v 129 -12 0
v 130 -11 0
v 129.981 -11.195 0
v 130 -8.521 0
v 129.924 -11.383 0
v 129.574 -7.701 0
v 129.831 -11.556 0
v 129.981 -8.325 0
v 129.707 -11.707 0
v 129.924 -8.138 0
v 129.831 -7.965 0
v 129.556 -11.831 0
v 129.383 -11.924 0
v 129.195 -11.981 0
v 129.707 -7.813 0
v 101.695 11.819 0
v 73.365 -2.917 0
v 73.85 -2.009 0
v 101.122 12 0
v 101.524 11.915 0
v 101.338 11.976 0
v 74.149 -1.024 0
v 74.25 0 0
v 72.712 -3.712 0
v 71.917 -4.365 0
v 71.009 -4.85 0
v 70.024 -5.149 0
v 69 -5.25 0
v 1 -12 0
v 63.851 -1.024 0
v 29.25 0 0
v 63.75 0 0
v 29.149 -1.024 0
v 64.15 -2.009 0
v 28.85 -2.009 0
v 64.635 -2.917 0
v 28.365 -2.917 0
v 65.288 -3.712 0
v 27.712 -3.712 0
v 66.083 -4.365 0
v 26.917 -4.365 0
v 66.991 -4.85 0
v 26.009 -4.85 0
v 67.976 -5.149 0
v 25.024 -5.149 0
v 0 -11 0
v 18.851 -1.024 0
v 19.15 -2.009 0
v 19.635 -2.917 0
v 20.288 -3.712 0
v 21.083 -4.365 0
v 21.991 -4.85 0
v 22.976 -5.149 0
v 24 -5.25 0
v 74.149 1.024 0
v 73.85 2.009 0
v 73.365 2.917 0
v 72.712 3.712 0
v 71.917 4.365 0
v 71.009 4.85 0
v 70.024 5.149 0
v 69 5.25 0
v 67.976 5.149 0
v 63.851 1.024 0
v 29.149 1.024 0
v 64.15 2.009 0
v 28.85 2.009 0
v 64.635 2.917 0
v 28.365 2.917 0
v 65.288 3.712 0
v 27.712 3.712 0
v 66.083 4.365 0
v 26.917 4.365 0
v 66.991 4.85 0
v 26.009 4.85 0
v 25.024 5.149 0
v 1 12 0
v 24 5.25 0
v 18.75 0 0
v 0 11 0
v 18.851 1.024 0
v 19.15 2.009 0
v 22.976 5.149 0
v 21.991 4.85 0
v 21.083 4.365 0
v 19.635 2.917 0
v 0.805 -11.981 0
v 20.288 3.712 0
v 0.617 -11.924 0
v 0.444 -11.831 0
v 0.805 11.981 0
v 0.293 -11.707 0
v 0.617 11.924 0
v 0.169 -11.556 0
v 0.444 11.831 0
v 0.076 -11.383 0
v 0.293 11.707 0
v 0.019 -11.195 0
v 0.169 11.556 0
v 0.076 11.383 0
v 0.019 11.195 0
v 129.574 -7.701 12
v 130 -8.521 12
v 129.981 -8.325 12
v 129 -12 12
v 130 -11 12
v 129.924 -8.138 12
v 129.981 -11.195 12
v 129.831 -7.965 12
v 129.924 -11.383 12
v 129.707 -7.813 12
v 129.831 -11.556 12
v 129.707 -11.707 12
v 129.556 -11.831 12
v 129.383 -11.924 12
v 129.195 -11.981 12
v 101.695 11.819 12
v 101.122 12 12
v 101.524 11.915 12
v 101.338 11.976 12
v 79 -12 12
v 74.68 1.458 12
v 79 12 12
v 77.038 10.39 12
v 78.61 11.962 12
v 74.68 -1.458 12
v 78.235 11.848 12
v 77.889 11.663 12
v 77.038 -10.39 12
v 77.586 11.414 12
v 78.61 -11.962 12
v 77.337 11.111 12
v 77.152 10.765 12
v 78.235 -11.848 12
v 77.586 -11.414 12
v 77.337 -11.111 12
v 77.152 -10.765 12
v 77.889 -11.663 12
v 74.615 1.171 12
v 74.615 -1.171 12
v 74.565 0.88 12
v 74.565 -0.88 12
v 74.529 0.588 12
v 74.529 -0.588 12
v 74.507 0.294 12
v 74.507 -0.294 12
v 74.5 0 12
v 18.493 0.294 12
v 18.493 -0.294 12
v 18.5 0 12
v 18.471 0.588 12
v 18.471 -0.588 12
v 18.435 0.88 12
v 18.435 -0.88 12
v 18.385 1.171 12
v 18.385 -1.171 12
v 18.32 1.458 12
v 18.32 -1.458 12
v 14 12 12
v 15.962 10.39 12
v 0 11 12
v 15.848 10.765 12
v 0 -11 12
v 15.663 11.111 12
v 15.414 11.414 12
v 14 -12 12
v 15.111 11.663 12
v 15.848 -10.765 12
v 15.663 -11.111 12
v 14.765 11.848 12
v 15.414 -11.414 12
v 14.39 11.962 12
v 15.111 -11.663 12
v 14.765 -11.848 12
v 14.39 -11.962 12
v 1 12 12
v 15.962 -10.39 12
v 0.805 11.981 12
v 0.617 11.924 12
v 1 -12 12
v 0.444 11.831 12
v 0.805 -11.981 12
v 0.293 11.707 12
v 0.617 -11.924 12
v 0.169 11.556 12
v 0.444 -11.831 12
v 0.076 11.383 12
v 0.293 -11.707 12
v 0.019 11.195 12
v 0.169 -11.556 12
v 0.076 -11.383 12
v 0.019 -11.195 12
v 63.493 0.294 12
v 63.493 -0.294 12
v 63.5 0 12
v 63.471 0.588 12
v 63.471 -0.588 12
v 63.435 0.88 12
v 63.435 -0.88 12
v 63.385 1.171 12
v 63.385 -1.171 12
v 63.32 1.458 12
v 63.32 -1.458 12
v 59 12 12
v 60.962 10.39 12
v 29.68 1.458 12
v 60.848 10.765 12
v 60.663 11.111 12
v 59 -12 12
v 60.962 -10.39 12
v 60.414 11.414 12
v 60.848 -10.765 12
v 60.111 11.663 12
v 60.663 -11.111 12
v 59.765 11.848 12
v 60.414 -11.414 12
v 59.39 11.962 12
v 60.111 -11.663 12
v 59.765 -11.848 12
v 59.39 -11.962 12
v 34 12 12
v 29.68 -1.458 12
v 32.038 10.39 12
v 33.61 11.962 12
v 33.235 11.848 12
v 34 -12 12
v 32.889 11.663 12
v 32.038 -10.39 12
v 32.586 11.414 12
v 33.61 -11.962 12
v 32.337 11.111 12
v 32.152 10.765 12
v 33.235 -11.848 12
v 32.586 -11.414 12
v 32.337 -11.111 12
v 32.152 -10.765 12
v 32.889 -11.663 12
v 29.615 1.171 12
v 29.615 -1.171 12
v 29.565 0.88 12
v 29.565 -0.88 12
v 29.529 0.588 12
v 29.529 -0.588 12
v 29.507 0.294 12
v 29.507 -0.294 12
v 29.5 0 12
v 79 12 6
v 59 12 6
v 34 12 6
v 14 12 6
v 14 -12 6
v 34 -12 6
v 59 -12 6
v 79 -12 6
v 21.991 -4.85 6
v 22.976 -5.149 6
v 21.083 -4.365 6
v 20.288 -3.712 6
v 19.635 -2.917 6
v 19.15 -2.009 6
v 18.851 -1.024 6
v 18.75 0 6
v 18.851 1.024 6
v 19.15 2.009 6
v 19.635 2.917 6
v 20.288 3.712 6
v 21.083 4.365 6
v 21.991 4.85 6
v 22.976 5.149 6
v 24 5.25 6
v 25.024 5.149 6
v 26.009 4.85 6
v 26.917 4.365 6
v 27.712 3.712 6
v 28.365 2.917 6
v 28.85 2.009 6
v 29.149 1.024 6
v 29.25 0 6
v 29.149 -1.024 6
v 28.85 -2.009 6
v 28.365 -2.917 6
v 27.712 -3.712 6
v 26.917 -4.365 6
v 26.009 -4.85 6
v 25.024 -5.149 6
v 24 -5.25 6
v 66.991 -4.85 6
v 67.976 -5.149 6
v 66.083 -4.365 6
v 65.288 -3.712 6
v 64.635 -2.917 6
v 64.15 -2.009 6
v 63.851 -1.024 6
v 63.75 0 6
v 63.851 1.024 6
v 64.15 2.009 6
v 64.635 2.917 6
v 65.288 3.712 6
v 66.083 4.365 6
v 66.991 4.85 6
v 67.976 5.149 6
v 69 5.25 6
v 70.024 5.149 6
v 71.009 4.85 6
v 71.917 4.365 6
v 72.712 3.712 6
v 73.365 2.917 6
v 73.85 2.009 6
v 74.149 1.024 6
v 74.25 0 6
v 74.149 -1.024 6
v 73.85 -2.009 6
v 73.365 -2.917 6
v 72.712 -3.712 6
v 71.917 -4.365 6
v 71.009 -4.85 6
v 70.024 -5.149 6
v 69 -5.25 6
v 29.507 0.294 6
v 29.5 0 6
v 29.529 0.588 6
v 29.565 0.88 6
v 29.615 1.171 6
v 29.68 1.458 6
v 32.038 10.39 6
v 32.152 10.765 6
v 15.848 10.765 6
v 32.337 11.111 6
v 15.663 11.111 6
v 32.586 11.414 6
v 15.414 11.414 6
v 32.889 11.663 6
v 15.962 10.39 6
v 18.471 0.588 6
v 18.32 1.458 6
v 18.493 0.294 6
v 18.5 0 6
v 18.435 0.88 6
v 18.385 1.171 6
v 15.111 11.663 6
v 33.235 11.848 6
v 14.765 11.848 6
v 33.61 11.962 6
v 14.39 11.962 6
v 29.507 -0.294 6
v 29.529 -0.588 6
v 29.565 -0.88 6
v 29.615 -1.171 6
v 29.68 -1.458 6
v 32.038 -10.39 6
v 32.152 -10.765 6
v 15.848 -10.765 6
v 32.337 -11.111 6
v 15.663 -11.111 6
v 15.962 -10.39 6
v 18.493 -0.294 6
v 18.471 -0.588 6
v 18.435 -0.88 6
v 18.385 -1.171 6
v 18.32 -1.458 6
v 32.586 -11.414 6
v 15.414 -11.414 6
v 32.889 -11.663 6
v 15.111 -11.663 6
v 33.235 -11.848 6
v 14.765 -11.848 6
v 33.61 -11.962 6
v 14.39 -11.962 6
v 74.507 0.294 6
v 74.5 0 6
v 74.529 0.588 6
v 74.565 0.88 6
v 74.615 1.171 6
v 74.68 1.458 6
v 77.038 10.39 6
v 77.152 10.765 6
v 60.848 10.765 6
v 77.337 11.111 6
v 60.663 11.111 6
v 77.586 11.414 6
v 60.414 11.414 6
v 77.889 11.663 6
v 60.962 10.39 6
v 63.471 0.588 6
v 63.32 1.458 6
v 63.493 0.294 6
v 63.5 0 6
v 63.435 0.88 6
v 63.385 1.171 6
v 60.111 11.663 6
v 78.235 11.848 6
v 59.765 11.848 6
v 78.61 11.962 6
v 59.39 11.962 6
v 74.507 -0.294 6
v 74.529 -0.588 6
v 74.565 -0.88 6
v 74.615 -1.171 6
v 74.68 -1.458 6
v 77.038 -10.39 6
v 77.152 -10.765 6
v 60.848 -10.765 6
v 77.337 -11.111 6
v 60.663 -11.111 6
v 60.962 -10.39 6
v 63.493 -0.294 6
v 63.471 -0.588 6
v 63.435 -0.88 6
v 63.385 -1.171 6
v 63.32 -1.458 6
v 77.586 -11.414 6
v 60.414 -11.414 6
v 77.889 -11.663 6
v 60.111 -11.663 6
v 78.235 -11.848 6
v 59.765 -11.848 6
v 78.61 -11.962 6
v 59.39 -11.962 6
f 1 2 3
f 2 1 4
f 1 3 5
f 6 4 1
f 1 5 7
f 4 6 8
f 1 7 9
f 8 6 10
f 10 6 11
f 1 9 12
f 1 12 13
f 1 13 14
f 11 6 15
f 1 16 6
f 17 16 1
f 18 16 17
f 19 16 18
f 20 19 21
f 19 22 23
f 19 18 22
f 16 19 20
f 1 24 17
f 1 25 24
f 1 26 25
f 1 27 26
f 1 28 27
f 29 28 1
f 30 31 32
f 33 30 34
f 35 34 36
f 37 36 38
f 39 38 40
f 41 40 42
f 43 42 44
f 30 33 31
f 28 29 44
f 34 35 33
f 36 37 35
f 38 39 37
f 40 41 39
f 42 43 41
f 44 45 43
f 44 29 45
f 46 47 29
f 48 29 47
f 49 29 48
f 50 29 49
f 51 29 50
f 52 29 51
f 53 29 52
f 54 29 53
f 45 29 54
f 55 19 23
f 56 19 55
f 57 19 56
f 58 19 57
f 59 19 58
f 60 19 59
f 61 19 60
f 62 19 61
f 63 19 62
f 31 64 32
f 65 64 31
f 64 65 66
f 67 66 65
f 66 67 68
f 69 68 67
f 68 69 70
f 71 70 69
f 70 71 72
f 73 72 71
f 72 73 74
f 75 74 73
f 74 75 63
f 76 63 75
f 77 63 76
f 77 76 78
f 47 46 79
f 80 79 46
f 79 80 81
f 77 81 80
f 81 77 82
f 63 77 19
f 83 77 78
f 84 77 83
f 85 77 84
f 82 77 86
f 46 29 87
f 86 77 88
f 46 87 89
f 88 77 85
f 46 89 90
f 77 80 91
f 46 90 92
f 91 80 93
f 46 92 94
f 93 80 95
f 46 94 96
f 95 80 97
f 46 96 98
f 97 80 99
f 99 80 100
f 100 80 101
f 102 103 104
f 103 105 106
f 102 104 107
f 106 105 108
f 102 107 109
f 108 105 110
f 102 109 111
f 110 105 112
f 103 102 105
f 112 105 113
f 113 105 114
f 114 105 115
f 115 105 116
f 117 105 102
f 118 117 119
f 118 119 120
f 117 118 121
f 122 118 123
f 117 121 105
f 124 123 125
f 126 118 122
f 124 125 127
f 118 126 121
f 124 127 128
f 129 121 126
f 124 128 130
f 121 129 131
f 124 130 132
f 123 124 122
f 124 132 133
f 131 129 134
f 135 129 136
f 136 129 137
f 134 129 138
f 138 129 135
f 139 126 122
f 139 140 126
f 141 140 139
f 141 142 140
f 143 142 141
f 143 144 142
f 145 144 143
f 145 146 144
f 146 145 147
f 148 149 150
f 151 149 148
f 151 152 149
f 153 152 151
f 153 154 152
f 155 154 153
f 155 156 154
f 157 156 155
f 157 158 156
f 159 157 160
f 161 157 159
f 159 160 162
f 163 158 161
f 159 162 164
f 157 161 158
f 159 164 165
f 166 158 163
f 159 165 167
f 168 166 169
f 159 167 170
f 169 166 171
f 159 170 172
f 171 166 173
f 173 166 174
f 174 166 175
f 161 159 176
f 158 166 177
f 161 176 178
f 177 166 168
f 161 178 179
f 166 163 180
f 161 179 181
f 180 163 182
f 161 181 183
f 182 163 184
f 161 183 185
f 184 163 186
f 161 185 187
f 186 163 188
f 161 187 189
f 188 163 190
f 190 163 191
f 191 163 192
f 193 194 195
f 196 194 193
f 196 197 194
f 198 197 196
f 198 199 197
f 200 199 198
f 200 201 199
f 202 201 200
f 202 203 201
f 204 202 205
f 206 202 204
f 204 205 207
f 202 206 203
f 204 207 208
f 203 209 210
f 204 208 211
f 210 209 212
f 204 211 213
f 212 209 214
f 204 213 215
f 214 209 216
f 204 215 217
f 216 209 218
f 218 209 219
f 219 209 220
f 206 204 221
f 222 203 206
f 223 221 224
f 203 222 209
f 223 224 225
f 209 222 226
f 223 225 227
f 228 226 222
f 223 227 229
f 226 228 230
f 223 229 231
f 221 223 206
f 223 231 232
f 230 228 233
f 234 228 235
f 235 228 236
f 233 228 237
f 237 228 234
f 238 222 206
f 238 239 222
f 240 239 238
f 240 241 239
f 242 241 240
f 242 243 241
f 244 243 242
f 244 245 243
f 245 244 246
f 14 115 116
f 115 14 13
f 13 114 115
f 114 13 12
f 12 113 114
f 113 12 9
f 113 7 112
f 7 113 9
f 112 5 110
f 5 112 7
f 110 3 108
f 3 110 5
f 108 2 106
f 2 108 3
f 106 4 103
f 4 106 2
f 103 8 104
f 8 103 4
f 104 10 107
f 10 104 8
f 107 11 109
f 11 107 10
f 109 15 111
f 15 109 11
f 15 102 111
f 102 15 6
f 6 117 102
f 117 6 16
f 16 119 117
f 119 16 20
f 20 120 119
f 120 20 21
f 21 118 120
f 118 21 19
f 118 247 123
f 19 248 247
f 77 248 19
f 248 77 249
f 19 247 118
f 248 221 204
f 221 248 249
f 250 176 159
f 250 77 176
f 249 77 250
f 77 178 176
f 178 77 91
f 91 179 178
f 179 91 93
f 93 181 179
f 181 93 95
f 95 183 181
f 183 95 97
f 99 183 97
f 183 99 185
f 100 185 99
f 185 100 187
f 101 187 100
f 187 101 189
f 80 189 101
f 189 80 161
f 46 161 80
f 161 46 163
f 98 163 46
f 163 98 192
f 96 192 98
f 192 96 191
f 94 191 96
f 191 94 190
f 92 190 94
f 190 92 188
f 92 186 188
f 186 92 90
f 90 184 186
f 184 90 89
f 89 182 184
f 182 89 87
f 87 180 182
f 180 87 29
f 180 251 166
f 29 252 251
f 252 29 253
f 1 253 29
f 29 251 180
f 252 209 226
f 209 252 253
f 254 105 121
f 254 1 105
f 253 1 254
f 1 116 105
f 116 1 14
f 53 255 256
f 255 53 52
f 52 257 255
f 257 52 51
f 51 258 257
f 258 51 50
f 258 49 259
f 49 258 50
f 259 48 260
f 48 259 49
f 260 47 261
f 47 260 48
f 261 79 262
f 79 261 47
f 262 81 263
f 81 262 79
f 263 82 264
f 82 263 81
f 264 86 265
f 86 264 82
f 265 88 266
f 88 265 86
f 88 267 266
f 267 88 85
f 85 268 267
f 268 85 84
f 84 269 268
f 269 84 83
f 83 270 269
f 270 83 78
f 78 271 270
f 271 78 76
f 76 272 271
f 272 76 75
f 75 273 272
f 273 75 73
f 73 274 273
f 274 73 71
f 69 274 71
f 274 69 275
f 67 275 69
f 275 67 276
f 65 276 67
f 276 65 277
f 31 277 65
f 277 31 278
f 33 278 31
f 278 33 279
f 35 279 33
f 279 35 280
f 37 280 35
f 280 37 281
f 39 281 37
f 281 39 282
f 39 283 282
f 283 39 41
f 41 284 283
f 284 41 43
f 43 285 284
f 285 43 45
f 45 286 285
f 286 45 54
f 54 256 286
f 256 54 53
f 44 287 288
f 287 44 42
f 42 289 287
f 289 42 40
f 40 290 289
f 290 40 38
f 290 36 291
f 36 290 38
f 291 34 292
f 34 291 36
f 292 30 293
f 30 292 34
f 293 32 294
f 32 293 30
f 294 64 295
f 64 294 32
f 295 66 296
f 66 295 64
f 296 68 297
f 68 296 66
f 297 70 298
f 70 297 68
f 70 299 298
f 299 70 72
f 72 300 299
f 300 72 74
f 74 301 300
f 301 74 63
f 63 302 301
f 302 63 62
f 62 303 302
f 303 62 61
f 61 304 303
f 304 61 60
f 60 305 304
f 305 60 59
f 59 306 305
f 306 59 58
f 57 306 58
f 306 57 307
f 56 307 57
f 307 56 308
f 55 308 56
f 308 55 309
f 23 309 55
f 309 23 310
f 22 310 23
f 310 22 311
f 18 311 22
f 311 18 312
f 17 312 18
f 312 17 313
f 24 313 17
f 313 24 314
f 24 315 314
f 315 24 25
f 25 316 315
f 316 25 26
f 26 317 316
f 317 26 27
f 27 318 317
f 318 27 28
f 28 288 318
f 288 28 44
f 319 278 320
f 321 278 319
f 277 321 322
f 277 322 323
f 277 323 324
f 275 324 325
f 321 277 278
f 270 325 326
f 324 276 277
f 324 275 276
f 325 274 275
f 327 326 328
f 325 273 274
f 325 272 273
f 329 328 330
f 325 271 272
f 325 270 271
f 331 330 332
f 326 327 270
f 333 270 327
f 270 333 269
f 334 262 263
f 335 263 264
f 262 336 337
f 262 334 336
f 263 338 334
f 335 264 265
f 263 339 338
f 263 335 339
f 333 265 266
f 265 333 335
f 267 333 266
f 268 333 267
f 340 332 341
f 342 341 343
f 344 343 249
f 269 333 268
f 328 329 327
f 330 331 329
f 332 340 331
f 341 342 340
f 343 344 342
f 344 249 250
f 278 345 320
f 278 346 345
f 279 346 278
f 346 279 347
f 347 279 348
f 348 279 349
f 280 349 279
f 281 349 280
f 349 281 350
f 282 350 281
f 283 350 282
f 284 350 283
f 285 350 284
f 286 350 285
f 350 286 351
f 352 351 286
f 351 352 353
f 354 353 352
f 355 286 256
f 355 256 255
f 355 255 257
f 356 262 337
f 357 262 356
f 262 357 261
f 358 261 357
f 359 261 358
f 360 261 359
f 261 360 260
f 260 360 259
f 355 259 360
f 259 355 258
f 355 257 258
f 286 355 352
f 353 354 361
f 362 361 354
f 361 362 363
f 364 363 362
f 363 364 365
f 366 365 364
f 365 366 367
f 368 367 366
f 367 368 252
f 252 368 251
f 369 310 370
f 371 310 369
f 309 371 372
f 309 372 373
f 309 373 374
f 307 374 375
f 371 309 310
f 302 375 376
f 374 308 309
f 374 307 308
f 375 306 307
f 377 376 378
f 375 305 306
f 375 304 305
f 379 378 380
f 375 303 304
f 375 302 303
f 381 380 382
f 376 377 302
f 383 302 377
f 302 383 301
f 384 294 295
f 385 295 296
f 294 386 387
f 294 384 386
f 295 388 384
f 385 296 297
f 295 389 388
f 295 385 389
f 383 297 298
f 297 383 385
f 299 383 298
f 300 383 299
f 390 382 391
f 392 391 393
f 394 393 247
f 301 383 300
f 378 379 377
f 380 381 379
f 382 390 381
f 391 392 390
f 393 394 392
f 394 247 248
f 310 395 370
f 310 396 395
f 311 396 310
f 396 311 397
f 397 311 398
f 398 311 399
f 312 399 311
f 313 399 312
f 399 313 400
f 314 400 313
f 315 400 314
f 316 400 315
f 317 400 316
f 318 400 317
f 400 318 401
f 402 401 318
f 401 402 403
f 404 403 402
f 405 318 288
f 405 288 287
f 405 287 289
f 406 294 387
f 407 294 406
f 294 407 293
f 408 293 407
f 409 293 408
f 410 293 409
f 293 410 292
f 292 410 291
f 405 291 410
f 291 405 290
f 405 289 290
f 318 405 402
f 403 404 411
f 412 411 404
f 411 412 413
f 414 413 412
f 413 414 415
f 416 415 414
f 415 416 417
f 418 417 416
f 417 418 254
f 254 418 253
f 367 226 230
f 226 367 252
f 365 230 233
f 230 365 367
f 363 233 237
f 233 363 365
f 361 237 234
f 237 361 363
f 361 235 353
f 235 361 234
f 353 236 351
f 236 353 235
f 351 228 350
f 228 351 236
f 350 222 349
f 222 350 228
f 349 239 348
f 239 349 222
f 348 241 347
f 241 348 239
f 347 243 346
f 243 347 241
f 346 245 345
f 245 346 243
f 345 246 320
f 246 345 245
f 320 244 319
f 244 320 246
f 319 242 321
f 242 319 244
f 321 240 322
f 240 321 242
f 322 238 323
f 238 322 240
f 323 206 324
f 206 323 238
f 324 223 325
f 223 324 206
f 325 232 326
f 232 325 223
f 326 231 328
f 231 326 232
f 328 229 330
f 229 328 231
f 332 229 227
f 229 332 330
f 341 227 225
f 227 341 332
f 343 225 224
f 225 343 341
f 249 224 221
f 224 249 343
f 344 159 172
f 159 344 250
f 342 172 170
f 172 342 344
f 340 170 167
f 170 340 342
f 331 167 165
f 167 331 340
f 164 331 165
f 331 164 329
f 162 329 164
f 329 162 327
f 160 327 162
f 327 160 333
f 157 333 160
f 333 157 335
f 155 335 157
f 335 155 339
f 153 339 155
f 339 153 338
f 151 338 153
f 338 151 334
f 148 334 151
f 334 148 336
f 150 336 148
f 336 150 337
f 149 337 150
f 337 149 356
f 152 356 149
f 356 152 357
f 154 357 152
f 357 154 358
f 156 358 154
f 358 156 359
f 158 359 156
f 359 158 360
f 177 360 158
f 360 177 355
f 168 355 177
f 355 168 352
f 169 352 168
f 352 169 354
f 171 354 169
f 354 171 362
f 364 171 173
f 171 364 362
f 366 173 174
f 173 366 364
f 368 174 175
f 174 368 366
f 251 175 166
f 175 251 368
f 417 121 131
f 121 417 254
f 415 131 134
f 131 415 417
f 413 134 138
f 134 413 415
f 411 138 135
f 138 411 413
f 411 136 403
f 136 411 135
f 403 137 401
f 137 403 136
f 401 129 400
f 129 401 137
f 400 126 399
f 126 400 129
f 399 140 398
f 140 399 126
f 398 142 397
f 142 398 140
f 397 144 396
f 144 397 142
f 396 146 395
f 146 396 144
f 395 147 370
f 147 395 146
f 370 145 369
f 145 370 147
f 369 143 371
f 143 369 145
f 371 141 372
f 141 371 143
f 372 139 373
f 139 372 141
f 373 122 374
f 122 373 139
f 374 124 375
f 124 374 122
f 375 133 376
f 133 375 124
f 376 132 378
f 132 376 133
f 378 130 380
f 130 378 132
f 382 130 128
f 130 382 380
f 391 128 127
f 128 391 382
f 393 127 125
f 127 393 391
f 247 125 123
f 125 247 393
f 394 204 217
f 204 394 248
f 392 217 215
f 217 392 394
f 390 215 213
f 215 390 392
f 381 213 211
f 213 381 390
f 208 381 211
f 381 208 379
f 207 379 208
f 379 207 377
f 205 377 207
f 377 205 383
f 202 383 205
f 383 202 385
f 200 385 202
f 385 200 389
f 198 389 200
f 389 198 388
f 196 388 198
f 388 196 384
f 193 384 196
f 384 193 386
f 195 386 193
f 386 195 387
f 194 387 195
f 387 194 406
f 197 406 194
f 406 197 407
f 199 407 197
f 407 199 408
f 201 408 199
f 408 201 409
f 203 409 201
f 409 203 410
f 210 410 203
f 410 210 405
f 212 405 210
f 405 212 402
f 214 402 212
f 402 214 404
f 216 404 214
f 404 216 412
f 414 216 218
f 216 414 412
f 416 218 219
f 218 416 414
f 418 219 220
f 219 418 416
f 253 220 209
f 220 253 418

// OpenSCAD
// file: clamp_lib.scad
gHolePos = [24,24+45];
gHoleDia = 10.5;
gWidth = 24;
gLength = 130;
gTipSize = 4;
gTipRotate = 55;
gBitSize = 4.1;

gPlatePitch = gWidth + gBitSize;
gRepeat = 4;

module ClampSide() {
  offset(r=1,$fn=32) offset(delta=-1) difference() {
    translate([0,-gWidth/2]) square([gLength,gWidth]);
    translate([gLength,-gWidth/2+gTipSize]) rotate([0,0,gTipRotate]) square([100,100]);
  }
}

module ClampSidePocket() {
  for(x=gHolePos) translate([x,0]) difference() {
    square([24,gWidth+8], center=true);
    for(x_scale=[1,-1]) scale([x_scale,1]) hull() {
      translate([11.5,0]) circle(d=12,$fn=128);
      for(y_scale=[1,-1]) scale([1,y_scale]) {
        translate([12-2,gWidth/2-2]) circle(d=4,$fn=32);
        translate([12,gWidth/2-2]) circle(d=4,$fn=32);
      }
    }
  }
}

module ClampSidePocketSimple() {
  for(x=gHolePos) translate([x,0]) square([20,gWidth+4], center=true);
}

module ClampSideThroughHole() {
  for(x=gHolePos) translate([x,0]) circle(d=gHoleDia,$fn=32);
}

module Lots() {
  for(i=[0:gRepeat-1])
    translate([0,i*gPlatePitch]) if (i % 2) {
      children();
    } else {
      scale([1,-1]) children();
    }
  
  for(i=[0:gRepeat-1])
    translate([gLength*2-15,i*gPlatePitch]) if (i % 2 == 0) {
      scale([-1,1]) children();
    } else {
      scale([-1,-1]) children();
    }
}
// main file
include <clamp_lib.scad>;

difference() {
  linear_extrude(height=12,convexity=12) difference() {
    ClampSide();
    ClampSideThroughHole();
  }
  translate([0,0,6]) linear_extrude(height=6.1,convexity=4)
    offset(r=2,$fn=32) offset(delta=-2)
    ClampSidePocket();
}
